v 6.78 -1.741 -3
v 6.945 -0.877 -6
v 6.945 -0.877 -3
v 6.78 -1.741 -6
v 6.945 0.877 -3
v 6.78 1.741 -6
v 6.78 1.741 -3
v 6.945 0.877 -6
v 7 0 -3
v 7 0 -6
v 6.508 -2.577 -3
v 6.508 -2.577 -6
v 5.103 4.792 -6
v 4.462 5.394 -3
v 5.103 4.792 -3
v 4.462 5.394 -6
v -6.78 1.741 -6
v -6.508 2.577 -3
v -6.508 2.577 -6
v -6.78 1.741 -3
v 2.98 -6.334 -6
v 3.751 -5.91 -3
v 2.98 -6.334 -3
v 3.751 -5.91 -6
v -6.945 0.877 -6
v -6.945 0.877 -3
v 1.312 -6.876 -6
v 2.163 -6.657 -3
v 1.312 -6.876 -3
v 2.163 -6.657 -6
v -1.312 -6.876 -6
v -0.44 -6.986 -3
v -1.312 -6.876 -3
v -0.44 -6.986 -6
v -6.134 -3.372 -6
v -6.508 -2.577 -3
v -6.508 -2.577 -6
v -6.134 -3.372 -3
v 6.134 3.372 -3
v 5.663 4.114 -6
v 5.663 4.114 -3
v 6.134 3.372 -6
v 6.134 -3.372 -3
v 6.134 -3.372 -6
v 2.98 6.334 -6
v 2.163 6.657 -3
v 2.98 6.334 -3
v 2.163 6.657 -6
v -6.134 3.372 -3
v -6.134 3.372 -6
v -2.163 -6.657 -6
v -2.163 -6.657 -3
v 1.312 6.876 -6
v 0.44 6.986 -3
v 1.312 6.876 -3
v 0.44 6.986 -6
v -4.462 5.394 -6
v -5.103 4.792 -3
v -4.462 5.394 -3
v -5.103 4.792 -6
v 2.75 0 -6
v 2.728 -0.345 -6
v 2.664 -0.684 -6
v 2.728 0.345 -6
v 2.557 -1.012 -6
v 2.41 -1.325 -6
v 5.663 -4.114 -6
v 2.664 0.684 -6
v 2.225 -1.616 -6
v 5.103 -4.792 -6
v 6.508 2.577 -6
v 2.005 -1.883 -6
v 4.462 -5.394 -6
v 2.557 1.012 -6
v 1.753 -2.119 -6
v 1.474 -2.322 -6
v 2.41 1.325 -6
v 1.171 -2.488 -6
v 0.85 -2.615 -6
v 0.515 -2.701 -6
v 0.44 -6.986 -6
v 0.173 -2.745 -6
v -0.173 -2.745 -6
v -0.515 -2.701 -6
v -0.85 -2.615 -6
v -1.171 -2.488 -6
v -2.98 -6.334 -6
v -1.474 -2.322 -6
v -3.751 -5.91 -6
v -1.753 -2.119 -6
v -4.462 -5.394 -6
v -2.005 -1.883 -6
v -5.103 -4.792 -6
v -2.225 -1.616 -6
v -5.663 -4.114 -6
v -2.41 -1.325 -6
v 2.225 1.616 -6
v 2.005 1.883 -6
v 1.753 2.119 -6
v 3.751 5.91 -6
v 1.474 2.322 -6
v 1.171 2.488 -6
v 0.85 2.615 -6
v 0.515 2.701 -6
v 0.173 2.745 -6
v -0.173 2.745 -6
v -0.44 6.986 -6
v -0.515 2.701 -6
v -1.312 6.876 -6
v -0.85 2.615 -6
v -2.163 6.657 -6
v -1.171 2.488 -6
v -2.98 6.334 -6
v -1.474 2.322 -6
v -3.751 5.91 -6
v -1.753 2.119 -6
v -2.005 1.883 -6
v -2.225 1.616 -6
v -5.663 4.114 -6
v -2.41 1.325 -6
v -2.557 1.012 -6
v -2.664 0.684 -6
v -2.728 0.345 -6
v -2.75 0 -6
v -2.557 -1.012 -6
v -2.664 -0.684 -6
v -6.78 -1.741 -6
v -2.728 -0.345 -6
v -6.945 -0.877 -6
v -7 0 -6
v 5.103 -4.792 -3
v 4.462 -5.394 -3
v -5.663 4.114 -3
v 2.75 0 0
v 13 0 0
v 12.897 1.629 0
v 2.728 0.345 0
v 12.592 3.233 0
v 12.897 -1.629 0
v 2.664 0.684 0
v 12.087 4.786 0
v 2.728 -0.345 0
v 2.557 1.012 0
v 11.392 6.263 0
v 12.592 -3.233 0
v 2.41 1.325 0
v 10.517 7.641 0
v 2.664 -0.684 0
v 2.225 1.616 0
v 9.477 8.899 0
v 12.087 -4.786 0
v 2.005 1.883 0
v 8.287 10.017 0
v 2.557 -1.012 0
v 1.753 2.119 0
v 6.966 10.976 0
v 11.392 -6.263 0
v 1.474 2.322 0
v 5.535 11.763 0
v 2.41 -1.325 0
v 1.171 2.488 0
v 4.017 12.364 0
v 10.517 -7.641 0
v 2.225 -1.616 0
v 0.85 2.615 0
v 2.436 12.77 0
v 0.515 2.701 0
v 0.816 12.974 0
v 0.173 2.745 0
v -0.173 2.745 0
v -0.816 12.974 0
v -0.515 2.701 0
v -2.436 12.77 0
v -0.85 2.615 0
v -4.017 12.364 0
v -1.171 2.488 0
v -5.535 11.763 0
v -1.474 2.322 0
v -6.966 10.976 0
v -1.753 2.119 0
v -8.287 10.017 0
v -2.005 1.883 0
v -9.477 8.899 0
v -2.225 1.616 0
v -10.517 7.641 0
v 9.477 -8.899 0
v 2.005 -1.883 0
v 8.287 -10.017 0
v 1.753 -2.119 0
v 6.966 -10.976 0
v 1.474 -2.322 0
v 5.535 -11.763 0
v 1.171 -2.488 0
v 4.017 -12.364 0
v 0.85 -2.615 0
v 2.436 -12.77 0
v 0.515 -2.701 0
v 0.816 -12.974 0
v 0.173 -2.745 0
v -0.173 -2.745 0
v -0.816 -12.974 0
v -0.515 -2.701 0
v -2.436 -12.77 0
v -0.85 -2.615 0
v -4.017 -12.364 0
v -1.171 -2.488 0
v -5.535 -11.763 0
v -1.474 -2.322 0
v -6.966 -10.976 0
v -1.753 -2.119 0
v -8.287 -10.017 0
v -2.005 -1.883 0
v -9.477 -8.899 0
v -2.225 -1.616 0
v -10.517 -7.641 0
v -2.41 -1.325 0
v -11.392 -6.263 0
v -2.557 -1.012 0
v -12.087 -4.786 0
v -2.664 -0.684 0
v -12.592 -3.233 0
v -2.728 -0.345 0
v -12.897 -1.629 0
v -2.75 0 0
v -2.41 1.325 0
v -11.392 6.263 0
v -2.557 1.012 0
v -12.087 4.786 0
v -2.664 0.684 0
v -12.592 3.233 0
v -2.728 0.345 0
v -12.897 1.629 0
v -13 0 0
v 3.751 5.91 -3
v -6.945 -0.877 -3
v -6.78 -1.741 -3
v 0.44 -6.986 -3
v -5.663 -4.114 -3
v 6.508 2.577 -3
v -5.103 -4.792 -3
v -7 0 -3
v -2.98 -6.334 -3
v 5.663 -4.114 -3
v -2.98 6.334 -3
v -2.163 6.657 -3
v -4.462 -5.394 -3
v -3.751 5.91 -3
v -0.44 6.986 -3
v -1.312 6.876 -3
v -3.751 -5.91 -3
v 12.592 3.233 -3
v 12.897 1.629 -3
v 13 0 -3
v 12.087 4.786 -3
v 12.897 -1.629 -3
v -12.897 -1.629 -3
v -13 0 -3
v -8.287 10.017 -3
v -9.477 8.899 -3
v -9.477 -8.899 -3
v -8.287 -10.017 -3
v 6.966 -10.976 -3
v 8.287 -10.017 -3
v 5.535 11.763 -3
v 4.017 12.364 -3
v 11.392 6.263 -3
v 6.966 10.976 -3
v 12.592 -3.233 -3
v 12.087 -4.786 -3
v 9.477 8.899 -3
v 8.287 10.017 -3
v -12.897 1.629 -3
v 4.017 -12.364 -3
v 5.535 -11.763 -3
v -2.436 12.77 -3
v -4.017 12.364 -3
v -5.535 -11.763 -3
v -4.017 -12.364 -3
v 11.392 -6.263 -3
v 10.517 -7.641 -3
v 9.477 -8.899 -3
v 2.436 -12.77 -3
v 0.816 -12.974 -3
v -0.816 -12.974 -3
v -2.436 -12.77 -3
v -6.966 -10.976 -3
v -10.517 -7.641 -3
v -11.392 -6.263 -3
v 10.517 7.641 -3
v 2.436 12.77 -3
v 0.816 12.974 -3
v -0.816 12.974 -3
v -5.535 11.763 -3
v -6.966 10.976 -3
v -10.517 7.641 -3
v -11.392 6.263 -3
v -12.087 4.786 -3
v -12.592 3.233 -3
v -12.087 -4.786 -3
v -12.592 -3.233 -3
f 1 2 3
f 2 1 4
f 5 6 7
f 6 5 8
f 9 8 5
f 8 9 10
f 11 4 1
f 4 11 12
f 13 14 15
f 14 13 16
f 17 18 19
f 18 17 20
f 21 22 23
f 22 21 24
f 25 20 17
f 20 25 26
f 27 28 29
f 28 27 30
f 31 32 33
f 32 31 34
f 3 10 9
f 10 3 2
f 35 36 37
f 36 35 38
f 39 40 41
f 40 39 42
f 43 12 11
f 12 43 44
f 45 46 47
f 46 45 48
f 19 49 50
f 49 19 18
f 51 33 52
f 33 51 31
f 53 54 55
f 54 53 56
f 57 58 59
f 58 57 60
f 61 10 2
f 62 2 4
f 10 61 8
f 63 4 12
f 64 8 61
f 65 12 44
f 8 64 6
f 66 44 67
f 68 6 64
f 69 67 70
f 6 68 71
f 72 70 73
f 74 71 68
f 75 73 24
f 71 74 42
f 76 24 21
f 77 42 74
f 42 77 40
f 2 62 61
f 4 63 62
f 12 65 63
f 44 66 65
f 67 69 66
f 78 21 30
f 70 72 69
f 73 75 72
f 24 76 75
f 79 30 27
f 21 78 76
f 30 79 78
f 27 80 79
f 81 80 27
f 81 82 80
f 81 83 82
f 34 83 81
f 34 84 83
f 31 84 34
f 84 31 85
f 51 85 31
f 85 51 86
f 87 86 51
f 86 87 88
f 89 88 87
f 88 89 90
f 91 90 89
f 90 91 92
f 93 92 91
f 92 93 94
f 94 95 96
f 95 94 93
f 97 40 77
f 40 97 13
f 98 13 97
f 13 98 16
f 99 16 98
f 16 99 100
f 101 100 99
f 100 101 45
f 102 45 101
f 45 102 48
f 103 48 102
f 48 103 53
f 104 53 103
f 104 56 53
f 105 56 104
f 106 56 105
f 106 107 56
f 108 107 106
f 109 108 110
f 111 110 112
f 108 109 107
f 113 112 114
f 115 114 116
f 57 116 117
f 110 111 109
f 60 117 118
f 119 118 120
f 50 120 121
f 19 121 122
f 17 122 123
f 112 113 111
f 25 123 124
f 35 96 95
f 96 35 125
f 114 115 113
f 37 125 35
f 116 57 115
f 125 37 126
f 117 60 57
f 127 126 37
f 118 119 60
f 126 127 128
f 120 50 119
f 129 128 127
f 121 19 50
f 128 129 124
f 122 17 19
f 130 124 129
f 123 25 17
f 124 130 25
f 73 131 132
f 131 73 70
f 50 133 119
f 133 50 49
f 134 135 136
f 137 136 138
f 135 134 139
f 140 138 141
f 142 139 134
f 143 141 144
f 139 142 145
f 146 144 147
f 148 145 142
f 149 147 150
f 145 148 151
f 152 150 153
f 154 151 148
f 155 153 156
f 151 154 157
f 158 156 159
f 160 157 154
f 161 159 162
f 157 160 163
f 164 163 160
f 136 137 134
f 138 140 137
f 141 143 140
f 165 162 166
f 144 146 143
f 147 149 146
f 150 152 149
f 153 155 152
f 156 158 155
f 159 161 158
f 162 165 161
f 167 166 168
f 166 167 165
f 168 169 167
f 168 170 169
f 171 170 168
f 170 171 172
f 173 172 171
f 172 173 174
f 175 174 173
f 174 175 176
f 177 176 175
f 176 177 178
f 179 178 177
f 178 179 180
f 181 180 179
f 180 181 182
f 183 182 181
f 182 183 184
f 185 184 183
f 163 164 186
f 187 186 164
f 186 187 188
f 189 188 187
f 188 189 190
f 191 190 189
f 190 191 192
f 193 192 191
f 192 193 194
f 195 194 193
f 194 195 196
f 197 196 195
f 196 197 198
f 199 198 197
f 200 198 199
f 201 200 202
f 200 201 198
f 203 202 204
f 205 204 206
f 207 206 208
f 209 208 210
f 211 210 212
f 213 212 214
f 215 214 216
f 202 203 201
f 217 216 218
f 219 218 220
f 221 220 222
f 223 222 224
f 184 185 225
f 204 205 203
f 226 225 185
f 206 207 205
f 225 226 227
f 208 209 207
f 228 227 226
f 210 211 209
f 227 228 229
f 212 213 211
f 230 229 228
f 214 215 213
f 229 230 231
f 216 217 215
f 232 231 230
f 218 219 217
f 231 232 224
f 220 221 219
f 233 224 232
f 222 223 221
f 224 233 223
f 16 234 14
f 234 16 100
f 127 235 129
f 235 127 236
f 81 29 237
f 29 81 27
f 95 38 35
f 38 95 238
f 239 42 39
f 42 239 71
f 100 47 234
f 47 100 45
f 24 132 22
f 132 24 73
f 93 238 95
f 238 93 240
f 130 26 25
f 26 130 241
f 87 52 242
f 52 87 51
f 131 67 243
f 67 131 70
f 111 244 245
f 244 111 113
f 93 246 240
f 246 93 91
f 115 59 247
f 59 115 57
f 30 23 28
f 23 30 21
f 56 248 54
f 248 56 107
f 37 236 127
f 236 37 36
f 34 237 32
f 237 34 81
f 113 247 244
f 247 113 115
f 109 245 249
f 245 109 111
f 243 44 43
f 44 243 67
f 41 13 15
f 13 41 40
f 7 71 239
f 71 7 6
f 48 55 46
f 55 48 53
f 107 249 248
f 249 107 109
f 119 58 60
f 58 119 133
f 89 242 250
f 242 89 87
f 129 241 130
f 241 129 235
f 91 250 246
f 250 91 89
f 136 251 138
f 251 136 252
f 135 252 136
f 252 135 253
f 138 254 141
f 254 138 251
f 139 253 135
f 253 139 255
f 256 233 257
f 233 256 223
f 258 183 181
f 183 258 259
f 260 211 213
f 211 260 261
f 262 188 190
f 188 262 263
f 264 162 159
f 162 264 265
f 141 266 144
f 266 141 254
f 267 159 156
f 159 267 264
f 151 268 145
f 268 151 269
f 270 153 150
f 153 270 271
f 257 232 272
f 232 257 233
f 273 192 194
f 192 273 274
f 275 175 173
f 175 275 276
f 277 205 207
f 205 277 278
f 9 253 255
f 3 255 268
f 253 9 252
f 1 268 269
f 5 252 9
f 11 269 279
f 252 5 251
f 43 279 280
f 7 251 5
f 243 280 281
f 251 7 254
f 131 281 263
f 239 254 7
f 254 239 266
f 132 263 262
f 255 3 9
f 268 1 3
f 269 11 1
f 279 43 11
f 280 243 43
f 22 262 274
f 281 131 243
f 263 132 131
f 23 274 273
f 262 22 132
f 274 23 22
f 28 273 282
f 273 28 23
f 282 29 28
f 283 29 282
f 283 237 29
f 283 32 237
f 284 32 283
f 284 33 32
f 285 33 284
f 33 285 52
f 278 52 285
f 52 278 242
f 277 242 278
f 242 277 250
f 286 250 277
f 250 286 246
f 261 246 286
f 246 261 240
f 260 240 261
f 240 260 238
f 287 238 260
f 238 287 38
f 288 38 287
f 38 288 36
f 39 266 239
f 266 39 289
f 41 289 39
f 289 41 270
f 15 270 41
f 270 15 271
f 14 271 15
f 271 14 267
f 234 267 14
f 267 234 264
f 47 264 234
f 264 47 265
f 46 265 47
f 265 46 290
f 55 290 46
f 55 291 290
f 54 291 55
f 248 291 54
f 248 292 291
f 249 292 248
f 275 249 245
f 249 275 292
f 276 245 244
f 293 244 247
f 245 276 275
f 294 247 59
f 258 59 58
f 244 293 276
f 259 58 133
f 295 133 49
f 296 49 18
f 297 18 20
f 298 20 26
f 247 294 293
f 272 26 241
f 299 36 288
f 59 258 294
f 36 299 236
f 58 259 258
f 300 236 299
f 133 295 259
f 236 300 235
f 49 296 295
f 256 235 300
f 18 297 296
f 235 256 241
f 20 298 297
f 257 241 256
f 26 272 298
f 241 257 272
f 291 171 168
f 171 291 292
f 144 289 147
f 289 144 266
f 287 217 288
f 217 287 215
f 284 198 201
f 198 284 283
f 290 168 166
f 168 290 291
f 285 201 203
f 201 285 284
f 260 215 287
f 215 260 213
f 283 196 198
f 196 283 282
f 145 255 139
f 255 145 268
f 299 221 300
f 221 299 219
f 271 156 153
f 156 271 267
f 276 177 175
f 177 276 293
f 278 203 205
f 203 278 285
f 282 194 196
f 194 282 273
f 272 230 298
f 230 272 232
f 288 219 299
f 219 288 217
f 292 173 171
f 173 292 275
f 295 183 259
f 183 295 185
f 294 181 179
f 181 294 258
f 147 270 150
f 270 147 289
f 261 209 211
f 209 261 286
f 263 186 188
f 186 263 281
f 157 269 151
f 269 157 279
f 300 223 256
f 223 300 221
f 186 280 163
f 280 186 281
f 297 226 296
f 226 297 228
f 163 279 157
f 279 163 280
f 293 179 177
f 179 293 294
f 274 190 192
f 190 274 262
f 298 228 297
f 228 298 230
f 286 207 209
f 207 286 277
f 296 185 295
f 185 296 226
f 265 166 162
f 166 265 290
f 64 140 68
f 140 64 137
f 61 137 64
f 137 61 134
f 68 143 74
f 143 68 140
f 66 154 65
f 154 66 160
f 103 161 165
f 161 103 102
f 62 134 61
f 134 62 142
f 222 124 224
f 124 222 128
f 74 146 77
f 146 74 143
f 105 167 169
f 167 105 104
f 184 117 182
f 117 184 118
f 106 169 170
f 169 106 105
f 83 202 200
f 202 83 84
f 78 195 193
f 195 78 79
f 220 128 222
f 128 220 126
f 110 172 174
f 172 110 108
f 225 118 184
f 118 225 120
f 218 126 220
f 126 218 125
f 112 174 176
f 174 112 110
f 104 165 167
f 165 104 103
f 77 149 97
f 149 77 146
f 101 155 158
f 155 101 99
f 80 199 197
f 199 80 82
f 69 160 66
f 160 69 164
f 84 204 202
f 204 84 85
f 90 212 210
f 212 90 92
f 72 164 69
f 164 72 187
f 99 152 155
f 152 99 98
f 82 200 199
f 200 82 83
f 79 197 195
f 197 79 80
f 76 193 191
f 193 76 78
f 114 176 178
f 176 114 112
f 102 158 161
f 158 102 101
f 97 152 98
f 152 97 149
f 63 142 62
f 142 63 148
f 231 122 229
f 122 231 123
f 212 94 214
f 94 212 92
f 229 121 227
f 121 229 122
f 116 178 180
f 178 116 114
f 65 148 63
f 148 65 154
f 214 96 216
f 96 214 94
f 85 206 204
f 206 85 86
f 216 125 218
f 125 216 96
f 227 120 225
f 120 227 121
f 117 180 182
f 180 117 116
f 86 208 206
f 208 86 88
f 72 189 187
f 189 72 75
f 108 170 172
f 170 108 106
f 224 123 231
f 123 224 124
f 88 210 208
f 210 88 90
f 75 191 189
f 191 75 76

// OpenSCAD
$fn = 50;


difference() {
	union() {
		translate(v = [0, 0, -6.0000000000]) {
			cylinder(h = 6, r = 7.0000000000);
		}
		translate(v = [0, 0, -3.0000000000]) {
			cylinder(h = 3, r = 13.0000000000);
		}
	}
	union() {
		#translate(v = [0, 0, -6]) {
			cylinder(h = 6, r = 2.7500000000);
		}
	}
}
